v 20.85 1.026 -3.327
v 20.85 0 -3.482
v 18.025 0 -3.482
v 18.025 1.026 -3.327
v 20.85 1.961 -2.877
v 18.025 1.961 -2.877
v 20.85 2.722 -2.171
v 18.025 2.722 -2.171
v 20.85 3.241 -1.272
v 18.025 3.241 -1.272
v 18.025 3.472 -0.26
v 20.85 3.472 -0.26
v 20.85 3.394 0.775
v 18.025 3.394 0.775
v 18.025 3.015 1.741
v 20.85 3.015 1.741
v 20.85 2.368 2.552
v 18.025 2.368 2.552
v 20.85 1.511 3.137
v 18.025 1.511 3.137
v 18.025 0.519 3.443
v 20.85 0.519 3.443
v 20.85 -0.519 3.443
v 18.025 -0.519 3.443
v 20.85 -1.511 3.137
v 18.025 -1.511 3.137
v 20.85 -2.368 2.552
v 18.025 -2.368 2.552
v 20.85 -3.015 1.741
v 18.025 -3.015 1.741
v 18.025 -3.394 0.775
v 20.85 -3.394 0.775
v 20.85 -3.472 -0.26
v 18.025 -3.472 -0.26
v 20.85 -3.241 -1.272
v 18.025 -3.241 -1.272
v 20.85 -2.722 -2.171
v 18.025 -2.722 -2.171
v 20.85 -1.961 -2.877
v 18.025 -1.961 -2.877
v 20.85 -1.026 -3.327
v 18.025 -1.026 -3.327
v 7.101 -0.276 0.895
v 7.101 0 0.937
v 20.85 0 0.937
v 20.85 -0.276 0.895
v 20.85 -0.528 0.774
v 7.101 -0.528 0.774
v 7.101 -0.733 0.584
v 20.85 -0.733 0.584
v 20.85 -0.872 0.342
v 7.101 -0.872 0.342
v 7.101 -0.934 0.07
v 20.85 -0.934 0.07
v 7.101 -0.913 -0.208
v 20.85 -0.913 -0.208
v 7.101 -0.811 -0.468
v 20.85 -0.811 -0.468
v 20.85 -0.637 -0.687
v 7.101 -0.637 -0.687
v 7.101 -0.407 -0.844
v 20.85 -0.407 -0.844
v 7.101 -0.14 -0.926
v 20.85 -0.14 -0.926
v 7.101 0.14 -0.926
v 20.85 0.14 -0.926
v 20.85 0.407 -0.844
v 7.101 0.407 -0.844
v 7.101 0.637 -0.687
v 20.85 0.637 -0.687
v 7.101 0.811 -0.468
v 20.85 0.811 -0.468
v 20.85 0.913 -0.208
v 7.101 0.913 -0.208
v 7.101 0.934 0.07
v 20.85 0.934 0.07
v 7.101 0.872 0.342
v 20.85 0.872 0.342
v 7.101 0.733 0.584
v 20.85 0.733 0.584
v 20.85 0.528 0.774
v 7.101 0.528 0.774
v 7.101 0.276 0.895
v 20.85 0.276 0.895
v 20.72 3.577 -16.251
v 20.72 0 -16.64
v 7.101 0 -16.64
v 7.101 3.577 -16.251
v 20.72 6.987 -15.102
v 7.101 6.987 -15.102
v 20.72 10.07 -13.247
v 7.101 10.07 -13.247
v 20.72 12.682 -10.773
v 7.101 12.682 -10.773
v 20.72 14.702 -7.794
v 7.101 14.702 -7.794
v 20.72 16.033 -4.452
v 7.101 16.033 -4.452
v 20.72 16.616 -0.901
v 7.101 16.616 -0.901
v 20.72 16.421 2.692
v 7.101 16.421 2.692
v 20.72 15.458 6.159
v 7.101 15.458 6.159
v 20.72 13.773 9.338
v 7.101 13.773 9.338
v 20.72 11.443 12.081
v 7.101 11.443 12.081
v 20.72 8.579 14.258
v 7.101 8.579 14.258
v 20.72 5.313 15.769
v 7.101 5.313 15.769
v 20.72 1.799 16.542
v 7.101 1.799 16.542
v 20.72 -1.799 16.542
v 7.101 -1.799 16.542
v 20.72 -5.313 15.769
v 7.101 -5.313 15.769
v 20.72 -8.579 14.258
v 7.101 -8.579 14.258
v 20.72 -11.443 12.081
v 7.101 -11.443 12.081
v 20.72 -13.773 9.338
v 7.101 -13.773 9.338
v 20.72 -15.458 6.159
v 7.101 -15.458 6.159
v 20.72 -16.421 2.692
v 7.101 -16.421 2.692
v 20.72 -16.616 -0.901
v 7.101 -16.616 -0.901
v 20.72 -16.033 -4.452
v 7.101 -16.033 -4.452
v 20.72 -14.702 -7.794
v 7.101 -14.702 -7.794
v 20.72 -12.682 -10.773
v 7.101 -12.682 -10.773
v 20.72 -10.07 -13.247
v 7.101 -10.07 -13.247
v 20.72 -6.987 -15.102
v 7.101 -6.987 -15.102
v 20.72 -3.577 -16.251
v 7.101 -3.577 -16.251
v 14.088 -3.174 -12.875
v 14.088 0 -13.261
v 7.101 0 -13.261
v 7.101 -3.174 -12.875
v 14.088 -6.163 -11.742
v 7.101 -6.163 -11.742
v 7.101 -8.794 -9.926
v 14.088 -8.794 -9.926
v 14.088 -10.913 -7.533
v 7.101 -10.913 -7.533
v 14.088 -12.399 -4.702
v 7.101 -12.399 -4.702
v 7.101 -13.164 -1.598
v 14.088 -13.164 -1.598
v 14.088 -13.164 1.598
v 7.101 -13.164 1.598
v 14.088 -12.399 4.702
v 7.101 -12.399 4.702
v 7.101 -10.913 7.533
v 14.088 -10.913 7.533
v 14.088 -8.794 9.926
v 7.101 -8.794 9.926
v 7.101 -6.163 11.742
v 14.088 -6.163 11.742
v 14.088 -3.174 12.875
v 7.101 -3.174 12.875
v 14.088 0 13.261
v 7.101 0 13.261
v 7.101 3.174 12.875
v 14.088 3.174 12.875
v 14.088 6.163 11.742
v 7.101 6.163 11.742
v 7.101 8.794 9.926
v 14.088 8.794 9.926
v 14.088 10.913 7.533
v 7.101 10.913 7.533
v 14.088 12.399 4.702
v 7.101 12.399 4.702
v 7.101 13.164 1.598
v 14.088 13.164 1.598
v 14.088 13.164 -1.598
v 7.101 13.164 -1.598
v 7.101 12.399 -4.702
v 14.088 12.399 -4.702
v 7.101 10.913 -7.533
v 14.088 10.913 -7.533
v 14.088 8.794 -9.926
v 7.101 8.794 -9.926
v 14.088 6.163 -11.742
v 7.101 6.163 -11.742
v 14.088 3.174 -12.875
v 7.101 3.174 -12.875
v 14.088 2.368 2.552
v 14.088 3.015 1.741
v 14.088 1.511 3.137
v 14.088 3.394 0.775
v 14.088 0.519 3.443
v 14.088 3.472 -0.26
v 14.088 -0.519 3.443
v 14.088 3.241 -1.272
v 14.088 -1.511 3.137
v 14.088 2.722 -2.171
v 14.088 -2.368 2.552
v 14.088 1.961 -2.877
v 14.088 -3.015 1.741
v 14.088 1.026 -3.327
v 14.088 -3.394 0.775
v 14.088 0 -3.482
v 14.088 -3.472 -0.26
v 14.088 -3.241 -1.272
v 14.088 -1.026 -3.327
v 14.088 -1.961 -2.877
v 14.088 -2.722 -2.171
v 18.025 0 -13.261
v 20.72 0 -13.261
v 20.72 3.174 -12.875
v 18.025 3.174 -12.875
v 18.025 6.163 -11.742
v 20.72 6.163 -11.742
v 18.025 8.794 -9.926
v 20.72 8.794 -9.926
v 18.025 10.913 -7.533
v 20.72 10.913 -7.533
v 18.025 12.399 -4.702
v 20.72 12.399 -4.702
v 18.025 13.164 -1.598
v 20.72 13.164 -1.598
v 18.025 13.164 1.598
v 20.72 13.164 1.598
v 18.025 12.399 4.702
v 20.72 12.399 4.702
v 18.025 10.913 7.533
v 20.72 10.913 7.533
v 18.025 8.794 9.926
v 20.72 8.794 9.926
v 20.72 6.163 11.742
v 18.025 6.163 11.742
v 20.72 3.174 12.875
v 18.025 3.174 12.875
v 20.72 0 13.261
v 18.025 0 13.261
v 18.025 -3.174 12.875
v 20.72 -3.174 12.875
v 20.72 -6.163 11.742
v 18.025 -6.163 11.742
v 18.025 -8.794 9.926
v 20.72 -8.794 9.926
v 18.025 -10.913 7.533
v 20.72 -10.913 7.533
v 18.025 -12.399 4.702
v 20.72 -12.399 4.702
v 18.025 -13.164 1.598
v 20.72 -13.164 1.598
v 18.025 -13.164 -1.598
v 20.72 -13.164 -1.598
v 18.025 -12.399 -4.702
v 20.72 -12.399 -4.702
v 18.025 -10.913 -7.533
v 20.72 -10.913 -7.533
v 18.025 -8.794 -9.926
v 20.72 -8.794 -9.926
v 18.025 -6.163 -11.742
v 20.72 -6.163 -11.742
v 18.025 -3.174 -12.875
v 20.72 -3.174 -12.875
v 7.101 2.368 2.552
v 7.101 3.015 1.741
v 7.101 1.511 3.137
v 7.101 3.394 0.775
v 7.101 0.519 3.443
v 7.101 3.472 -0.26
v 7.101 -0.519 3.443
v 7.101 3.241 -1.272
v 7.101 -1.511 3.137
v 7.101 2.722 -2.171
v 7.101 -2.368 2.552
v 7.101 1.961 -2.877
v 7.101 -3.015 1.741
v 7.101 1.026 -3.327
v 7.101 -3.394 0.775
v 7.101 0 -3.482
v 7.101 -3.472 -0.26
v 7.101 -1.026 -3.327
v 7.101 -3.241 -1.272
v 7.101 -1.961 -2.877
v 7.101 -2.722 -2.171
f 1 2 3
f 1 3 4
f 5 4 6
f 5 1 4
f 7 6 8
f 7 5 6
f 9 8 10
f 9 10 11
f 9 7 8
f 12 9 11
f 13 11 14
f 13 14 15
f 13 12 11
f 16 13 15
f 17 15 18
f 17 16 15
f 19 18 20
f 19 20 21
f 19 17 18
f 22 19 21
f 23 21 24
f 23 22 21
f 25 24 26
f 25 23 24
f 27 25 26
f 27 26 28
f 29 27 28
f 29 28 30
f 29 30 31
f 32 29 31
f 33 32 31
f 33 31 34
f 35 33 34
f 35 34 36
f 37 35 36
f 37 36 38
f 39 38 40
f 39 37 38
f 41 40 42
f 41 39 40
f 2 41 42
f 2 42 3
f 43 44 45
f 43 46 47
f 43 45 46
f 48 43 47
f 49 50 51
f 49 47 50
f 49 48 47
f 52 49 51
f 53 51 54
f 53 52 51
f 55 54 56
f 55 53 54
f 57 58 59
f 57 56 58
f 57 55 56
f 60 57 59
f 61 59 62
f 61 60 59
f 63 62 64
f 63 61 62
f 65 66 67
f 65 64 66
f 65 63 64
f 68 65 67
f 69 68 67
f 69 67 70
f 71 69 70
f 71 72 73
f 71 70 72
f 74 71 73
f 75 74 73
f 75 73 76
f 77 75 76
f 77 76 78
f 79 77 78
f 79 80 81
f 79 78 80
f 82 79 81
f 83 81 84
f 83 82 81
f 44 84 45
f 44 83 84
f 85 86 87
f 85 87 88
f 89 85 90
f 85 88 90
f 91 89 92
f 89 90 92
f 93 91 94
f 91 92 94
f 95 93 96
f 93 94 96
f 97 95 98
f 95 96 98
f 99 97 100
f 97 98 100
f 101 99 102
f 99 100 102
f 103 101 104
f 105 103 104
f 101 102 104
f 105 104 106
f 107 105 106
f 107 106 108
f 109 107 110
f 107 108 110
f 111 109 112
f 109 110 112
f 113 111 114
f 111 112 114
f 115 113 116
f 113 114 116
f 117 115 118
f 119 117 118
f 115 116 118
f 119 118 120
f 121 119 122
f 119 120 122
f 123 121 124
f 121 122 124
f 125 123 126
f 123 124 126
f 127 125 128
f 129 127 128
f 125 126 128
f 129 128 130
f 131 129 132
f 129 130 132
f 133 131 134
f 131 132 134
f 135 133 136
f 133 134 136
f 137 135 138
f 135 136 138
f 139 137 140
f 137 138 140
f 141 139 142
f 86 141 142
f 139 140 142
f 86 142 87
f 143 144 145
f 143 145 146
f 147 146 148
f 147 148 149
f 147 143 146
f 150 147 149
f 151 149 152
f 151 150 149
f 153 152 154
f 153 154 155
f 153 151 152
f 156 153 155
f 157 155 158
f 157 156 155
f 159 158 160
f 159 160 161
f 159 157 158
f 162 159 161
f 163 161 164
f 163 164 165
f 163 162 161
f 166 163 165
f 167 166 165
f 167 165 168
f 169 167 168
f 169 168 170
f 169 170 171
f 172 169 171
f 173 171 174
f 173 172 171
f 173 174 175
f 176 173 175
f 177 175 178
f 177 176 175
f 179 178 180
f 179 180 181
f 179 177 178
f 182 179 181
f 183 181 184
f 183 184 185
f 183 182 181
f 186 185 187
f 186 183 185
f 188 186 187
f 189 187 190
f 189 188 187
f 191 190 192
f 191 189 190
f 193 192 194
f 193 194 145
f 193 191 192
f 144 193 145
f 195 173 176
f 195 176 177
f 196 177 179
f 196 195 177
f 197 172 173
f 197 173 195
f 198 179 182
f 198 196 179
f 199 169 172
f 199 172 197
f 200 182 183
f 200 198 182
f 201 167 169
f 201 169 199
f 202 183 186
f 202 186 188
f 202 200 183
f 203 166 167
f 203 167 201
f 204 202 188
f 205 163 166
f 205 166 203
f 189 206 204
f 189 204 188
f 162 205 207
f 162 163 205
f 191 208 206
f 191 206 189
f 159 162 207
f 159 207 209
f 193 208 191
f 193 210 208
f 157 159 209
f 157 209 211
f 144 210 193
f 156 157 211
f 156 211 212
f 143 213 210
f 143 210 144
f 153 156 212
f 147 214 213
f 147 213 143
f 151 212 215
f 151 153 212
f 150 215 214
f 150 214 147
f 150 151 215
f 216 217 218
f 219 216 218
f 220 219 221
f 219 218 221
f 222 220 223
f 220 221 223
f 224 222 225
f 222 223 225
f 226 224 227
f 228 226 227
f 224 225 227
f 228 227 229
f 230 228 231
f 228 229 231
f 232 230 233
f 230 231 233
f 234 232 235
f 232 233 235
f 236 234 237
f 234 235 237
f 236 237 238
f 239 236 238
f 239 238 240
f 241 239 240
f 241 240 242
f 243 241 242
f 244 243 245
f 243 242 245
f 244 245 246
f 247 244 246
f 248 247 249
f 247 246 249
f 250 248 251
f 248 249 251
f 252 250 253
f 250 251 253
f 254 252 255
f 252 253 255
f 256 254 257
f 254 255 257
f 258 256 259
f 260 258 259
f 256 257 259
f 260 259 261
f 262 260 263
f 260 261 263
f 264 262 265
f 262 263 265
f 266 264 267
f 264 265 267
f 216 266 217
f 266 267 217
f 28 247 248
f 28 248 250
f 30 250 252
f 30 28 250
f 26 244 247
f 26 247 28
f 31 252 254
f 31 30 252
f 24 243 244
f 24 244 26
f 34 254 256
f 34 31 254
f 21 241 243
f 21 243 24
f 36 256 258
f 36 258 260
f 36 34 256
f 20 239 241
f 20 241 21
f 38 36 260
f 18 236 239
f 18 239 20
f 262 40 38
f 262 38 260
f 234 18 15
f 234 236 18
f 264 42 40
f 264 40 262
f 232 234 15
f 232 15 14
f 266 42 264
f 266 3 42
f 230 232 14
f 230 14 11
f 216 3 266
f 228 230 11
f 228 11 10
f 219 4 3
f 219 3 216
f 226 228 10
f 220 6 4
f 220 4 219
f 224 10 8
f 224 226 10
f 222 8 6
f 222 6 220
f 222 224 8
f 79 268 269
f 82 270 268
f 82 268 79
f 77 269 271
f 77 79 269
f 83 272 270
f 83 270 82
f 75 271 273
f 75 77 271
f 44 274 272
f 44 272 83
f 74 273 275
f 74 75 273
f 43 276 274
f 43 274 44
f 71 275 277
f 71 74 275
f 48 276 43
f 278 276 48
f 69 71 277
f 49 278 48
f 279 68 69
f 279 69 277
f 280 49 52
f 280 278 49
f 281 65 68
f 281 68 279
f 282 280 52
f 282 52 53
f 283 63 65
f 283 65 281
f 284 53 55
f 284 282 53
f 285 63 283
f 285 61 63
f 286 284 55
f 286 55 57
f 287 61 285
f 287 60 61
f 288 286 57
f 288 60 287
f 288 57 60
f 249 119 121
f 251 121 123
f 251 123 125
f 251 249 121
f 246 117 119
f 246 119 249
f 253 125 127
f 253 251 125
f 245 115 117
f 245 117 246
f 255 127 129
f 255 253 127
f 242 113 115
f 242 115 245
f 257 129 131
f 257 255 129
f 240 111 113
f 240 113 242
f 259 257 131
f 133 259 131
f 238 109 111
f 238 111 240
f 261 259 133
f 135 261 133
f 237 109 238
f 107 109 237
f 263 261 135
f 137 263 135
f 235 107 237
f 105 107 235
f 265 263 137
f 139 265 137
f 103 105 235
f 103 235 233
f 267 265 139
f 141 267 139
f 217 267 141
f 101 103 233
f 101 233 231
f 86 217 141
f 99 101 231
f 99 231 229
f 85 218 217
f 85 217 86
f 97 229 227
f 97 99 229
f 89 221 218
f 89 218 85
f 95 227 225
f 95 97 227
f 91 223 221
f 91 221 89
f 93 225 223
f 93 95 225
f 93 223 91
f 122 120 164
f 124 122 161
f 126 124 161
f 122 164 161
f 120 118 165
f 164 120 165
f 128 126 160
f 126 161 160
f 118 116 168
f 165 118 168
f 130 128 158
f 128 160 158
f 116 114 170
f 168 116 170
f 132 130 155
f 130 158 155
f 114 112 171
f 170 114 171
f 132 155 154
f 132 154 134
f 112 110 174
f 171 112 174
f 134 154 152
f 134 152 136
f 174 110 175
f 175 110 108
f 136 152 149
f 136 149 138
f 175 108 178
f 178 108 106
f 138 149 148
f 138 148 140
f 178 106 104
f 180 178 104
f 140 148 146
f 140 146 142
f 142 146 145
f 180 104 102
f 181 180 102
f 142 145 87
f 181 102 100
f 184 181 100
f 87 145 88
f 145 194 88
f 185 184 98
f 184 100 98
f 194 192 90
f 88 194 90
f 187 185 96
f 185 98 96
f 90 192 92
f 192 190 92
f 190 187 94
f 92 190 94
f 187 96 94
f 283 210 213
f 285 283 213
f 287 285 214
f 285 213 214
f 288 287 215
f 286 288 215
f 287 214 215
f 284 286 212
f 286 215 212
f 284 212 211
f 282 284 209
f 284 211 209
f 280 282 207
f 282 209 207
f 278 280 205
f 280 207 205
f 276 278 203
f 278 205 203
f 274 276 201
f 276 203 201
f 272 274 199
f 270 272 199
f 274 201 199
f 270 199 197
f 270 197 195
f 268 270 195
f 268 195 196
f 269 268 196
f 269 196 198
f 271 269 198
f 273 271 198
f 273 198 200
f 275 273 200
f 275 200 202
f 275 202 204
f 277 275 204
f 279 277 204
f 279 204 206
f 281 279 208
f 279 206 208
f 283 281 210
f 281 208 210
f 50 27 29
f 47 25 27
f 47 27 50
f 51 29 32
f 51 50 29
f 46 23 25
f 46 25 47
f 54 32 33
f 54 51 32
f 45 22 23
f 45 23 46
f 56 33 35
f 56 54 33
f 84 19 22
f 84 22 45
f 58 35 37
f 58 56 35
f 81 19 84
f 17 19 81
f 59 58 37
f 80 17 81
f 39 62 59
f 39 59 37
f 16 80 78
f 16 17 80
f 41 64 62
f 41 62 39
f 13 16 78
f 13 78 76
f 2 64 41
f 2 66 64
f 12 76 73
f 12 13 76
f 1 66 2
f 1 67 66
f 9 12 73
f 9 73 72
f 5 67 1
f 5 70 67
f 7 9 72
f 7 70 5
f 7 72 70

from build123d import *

# Parameters (mm, degrees)
SKETCH2_R               = 32.5
BOSS_EXTRUDE1_DEPTH     = 26.6
SKETCH3_R               = 25.9
CUT_EXTRUDE2_DEPTH      = 5.264
CUT_EXTRUDE3_START      = -13.646
SKETCH4_R               = 25.9
CUT_EXTRUDE3_DEPTH      = 13.646
SKETCH5_R               = 6.8
BOSS_EXTRUDE2_DEPTH     = 13.646
BOSS_EXTRUDE3_START     = 5.518
SKETCH6_R               = 6.8
BOSS_EXTRUDE3_DEPTH     = 5.518
CUT_EXTRUDE4_DEPTH      = 28.702
CUT_EXTRUDE4_DEPTH_BACK = 38.03
SKETCH7_R               = 1.83
SCALE1_SCALE            = 0.8
SCALE2_SCALE            = 0.8
SCALE3_SCALE            = 0.8


with BuildPart() as part:
    # Sketch2 → Boss-Extrude1 (new body)
    with BuildSketch(Plane(origin=(0, 0, 0), x_dir=(0, 0, -1), z_dir=(1, 0, 0))):
        Circle(SKETCH2_R)
    extrude(amount=BOSS_EXTRUDE1_DEPTH)

    # Sketch3 → Cut-Extrude2 (cut)
    with BuildSketch(Plane(origin=(26.6, 0, 0), x_dir=(0, 0, -1), z_dir=(1, 0, 0))):
        Circle(SKETCH3_R)
    extrude(amount=-CUT_EXTRUDE2_DEPTH, mode=Mode.SUBTRACT)

    # Sketch4 → Cut-Extrude3 (cut)
    with BuildSketch(Plane.ZY.offset(CUT_EXTRUDE3_START)):
        with Locations(Location((0, 0, 0), (0, 0, 180))):
            Circle(SKETCH4_R)
    extrude(amount=CUT_EXTRUDE3_DEPTH, mode=Mode.SUBTRACT)

    # Sketch5 → Boss-Extrude2 (add)
    with BuildSketch(Plane.ZY.offset(-13.646)):
        with Locations(Location((0, 0, 0), (0, 0, 180))):
            Circle(SKETCH5_R)
    extrude(amount=BOSS_EXTRUDE2_DEPTH)

    # Sketch6 → Boss-Extrude3 (add)
    with BuildSketch(Plane(origin=(21.336, 0, 0), x_dir=(0, 0, -1), z_dir=(1, 0, 0)).offset(BOSS_EXTRUDE3_START)):
        Circle(SKETCH6_R)
    extrude(amount=-BOSS_EXTRUDE3_DEPTH)

    # Sketch7 → Cut-Extrude4 (cut, two sides: drawn at the far end of the back side and taken through both)
    with BuildSketch(Plane(origin=(26.854, 0, 0), x_dir=(0, 0, -1), z_dir=(1, 0, 0)).offset(-CUT_EXTRUDE4_DEPTH_BACK)):
        with Locations(Location((0, 0, 0), (0, 0, 180))):
            Circle(SKETCH7_R)
    extrude(amount=CUT_EXTRUDE4_DEPTH + CUT_EXTRUDE4_DEPTH_BACK, mode=Mode.SUBTRACT)


with BuildPart() as part_1:
    # Scale1: scaled about (14.550993836, 0, 0)
    add(part.part.scale(SCALE1_SCALE).moved(Location((2.910198767, 0, 0))))


with BuildPart() as part_2:
    # Scale2: scaled about (14.550993836, 0, 0)
    add(part_1.part.scale(SCALE2_SCALE).moved(Location((2.910198767, 0, 0))))


with BuildPart() as part_3:
    # Scale3: scaled about (14.550993836, 0, 0)
    add(part_2.part.scale(SCALE3_SCALE).moved(Location((2.910198767, 0, 0))))


solid = part_3.part
